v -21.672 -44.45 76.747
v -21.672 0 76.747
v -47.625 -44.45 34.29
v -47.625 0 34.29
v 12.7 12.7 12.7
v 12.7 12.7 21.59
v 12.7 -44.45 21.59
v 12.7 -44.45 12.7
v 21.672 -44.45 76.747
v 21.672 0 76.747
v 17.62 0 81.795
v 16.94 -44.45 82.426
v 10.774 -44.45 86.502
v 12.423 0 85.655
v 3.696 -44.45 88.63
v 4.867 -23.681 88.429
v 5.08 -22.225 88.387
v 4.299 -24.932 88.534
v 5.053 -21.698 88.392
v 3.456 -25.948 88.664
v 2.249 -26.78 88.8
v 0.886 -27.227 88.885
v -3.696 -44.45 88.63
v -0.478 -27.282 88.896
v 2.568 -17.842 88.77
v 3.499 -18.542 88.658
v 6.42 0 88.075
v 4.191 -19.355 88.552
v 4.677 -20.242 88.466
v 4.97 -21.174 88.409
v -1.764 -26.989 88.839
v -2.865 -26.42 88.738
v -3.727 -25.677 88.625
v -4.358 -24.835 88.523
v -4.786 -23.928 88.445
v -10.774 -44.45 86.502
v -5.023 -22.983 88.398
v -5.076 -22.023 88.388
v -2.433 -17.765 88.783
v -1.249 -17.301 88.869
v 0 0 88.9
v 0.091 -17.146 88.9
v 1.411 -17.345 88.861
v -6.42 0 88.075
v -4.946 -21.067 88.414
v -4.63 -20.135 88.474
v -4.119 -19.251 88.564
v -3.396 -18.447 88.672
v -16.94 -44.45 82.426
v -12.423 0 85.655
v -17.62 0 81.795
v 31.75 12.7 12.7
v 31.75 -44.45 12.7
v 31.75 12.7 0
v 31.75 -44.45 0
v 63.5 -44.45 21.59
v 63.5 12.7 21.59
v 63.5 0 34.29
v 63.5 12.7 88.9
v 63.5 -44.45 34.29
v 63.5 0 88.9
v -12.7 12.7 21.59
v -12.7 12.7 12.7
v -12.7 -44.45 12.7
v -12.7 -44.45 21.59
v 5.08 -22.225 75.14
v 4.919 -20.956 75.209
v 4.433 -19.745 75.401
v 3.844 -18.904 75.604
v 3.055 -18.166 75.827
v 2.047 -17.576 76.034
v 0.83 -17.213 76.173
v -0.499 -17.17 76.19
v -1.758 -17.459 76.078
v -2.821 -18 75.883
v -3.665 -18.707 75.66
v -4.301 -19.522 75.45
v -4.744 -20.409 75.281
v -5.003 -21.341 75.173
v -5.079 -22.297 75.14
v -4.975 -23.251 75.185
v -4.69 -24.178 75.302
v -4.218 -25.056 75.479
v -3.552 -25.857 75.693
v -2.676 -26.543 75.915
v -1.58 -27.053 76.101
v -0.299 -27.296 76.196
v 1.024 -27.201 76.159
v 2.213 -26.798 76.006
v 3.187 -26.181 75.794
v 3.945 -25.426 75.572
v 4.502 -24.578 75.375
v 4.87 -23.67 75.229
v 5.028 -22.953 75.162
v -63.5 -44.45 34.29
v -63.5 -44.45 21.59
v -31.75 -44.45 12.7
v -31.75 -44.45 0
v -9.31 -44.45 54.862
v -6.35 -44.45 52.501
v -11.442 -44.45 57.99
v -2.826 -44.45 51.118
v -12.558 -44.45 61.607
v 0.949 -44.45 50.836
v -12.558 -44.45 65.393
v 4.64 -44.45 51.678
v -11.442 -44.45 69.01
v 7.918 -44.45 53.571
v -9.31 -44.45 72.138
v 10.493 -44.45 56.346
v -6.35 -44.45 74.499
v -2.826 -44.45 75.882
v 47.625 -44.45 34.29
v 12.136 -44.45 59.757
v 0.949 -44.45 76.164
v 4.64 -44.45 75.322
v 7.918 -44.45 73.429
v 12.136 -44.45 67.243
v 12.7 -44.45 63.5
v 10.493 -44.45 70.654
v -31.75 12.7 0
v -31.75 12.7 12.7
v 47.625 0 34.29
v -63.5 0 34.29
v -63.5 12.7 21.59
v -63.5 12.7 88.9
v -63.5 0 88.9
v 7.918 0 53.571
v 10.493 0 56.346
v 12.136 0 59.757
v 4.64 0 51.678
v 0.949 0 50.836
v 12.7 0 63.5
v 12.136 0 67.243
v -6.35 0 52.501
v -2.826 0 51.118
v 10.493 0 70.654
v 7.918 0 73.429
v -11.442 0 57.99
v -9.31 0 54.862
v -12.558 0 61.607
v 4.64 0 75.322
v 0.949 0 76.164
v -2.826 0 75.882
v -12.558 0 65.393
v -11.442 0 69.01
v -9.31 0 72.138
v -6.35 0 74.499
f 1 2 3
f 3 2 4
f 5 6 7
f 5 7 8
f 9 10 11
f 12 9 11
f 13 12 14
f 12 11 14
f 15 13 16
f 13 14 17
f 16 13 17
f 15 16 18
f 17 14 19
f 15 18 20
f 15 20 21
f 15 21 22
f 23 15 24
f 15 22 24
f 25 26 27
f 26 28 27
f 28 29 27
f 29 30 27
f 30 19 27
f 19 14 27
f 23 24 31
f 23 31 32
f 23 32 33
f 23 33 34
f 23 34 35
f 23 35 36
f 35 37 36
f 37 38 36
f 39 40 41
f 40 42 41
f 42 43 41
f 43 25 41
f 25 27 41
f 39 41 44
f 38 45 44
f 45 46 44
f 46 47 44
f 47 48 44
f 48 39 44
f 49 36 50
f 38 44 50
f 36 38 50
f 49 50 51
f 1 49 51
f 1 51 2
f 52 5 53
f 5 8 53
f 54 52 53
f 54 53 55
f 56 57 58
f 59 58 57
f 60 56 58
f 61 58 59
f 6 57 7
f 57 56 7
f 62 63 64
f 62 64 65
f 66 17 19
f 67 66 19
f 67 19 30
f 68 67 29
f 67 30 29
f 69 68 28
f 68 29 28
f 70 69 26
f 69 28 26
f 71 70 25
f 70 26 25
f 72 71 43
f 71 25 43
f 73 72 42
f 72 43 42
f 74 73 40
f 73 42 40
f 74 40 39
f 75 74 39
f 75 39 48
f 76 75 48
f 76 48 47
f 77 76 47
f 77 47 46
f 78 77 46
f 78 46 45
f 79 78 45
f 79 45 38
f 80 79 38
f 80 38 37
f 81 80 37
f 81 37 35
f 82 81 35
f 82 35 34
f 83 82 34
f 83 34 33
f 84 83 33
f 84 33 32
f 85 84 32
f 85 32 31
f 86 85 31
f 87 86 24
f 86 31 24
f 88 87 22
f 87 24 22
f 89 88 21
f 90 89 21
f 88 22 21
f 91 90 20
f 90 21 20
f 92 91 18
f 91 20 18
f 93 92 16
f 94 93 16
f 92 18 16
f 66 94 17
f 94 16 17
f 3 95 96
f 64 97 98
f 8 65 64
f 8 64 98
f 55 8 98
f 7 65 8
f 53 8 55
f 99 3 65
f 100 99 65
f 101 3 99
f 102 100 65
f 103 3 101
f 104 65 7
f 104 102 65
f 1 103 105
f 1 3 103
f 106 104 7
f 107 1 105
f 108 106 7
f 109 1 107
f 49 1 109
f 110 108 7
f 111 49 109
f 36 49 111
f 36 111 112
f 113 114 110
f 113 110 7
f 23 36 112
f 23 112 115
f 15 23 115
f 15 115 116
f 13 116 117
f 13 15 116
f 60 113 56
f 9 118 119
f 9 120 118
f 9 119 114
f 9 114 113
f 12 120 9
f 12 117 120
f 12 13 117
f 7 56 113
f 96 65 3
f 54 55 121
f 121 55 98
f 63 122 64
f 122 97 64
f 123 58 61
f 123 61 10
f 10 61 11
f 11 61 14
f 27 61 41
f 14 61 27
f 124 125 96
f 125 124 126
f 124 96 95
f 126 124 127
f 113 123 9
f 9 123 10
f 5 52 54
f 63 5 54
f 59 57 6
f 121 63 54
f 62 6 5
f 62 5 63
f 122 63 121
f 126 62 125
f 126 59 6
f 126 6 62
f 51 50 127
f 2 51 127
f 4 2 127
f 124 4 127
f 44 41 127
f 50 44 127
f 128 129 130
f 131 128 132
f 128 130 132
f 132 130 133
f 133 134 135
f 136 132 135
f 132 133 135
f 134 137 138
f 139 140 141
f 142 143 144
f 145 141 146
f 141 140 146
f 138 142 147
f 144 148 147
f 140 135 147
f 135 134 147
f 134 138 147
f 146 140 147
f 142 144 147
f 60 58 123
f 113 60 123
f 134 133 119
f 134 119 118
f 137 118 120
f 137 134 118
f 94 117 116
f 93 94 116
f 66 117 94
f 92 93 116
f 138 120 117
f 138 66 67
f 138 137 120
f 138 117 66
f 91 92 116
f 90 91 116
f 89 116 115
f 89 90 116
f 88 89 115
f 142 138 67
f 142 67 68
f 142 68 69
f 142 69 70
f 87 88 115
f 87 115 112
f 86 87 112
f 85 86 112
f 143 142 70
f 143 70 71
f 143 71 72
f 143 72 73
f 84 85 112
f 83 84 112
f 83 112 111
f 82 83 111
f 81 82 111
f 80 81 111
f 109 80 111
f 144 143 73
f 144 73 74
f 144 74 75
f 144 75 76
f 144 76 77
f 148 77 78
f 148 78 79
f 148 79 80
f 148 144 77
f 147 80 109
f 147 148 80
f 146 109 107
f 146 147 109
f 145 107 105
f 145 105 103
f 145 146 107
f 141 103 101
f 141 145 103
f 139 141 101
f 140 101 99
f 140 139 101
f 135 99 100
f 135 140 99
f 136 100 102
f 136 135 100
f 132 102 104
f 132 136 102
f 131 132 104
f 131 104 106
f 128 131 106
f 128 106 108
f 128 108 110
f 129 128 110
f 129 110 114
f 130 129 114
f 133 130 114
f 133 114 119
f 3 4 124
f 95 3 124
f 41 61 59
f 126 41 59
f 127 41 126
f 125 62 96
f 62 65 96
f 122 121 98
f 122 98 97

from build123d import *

# Parameters (mm, degrees)
F0_R     = 12.7
F1_DEPTH = 44.45
F2_W     = 127
F2_H     = 67.31
F3_DEPTH = 12.7
F4_R     = 5.08
F5_DEPTH = 13.7612578348


with BuildPart() as f1:
    # F0 (on Front) → F1 (new body)
    with BuildSketch(Plane.XZ):
        with BuildLine():
            Line((-31.75, 12.7), (-31.75, 0))
            Line((-31.75, 0), (31.75, 0))
            Line((31.75, 0), (31.75, 12.7))
            Line((31.75, 12.7), (12.7, 12.7))
            Line((12.7, 12.7), (12.7, 21.59))
            Line((12.7, 21.59), (63.5, 21.59))
            Line((63.5, 21.59), (63.5, 34.29))
            Line((63.5, 34.29), (47.625, 34.29))
            Line((47.625, 34.29), (21.6717633531, 76.7474402496))
            ThreePointArc((21.6717633531, 76.7474402496), (0, 88.9), (-21.6717633531, 76.7474402496))
            Line((-21.6717633531, 76.7474402496), (-47.625, 34.29))
            Line((-47.625, 34.29), (-63.5, 34.29))
            Line((-63.5, 34.29), (-63.5, 21.59))
            Line((-63.5, 21.59), (-12.7, 21.59))
            Line((-12.7, 21.59), (-12.7, 12.7))
            Line((-12.7, 12.7), (-31.75, 12.7))
        make_face()
        with Locations((0, 63.5)):
            Circle(F0_R, mode=Mode.SUBTRACT)
    extrude(amount=F1_DEPTH)

    # F2 (on face) → F3 (join)
    with BuildSketch(Plane(origin=(0, 0, 0), x_dir=(-1, 0, 0), z_dir=(0, 1, 0))):
        with Locations((0, 55.245)):
            Rectangle(F2_W, F2_H)
        Polygon((12.7, 21.59), (-12.7, 21.59), (-12.7, 12.7), (-31.75, 12.7), (-31.75, 0), (31.75, 0), (31.75, 12.7), (12.7, 12.7), align=None)
    extrude(amount=F3_DEPTH)

    # F4 (on face) → F5 (cut, through all)
    with BuildSketch(Plane.XY.offset(88.9)):
        with Locations((0, -22.225)):
            Circle(F4_R)
    extrude(amount=-F5_DEPTH, mode=Mode.SUBTRACT)


solid = f1.part
